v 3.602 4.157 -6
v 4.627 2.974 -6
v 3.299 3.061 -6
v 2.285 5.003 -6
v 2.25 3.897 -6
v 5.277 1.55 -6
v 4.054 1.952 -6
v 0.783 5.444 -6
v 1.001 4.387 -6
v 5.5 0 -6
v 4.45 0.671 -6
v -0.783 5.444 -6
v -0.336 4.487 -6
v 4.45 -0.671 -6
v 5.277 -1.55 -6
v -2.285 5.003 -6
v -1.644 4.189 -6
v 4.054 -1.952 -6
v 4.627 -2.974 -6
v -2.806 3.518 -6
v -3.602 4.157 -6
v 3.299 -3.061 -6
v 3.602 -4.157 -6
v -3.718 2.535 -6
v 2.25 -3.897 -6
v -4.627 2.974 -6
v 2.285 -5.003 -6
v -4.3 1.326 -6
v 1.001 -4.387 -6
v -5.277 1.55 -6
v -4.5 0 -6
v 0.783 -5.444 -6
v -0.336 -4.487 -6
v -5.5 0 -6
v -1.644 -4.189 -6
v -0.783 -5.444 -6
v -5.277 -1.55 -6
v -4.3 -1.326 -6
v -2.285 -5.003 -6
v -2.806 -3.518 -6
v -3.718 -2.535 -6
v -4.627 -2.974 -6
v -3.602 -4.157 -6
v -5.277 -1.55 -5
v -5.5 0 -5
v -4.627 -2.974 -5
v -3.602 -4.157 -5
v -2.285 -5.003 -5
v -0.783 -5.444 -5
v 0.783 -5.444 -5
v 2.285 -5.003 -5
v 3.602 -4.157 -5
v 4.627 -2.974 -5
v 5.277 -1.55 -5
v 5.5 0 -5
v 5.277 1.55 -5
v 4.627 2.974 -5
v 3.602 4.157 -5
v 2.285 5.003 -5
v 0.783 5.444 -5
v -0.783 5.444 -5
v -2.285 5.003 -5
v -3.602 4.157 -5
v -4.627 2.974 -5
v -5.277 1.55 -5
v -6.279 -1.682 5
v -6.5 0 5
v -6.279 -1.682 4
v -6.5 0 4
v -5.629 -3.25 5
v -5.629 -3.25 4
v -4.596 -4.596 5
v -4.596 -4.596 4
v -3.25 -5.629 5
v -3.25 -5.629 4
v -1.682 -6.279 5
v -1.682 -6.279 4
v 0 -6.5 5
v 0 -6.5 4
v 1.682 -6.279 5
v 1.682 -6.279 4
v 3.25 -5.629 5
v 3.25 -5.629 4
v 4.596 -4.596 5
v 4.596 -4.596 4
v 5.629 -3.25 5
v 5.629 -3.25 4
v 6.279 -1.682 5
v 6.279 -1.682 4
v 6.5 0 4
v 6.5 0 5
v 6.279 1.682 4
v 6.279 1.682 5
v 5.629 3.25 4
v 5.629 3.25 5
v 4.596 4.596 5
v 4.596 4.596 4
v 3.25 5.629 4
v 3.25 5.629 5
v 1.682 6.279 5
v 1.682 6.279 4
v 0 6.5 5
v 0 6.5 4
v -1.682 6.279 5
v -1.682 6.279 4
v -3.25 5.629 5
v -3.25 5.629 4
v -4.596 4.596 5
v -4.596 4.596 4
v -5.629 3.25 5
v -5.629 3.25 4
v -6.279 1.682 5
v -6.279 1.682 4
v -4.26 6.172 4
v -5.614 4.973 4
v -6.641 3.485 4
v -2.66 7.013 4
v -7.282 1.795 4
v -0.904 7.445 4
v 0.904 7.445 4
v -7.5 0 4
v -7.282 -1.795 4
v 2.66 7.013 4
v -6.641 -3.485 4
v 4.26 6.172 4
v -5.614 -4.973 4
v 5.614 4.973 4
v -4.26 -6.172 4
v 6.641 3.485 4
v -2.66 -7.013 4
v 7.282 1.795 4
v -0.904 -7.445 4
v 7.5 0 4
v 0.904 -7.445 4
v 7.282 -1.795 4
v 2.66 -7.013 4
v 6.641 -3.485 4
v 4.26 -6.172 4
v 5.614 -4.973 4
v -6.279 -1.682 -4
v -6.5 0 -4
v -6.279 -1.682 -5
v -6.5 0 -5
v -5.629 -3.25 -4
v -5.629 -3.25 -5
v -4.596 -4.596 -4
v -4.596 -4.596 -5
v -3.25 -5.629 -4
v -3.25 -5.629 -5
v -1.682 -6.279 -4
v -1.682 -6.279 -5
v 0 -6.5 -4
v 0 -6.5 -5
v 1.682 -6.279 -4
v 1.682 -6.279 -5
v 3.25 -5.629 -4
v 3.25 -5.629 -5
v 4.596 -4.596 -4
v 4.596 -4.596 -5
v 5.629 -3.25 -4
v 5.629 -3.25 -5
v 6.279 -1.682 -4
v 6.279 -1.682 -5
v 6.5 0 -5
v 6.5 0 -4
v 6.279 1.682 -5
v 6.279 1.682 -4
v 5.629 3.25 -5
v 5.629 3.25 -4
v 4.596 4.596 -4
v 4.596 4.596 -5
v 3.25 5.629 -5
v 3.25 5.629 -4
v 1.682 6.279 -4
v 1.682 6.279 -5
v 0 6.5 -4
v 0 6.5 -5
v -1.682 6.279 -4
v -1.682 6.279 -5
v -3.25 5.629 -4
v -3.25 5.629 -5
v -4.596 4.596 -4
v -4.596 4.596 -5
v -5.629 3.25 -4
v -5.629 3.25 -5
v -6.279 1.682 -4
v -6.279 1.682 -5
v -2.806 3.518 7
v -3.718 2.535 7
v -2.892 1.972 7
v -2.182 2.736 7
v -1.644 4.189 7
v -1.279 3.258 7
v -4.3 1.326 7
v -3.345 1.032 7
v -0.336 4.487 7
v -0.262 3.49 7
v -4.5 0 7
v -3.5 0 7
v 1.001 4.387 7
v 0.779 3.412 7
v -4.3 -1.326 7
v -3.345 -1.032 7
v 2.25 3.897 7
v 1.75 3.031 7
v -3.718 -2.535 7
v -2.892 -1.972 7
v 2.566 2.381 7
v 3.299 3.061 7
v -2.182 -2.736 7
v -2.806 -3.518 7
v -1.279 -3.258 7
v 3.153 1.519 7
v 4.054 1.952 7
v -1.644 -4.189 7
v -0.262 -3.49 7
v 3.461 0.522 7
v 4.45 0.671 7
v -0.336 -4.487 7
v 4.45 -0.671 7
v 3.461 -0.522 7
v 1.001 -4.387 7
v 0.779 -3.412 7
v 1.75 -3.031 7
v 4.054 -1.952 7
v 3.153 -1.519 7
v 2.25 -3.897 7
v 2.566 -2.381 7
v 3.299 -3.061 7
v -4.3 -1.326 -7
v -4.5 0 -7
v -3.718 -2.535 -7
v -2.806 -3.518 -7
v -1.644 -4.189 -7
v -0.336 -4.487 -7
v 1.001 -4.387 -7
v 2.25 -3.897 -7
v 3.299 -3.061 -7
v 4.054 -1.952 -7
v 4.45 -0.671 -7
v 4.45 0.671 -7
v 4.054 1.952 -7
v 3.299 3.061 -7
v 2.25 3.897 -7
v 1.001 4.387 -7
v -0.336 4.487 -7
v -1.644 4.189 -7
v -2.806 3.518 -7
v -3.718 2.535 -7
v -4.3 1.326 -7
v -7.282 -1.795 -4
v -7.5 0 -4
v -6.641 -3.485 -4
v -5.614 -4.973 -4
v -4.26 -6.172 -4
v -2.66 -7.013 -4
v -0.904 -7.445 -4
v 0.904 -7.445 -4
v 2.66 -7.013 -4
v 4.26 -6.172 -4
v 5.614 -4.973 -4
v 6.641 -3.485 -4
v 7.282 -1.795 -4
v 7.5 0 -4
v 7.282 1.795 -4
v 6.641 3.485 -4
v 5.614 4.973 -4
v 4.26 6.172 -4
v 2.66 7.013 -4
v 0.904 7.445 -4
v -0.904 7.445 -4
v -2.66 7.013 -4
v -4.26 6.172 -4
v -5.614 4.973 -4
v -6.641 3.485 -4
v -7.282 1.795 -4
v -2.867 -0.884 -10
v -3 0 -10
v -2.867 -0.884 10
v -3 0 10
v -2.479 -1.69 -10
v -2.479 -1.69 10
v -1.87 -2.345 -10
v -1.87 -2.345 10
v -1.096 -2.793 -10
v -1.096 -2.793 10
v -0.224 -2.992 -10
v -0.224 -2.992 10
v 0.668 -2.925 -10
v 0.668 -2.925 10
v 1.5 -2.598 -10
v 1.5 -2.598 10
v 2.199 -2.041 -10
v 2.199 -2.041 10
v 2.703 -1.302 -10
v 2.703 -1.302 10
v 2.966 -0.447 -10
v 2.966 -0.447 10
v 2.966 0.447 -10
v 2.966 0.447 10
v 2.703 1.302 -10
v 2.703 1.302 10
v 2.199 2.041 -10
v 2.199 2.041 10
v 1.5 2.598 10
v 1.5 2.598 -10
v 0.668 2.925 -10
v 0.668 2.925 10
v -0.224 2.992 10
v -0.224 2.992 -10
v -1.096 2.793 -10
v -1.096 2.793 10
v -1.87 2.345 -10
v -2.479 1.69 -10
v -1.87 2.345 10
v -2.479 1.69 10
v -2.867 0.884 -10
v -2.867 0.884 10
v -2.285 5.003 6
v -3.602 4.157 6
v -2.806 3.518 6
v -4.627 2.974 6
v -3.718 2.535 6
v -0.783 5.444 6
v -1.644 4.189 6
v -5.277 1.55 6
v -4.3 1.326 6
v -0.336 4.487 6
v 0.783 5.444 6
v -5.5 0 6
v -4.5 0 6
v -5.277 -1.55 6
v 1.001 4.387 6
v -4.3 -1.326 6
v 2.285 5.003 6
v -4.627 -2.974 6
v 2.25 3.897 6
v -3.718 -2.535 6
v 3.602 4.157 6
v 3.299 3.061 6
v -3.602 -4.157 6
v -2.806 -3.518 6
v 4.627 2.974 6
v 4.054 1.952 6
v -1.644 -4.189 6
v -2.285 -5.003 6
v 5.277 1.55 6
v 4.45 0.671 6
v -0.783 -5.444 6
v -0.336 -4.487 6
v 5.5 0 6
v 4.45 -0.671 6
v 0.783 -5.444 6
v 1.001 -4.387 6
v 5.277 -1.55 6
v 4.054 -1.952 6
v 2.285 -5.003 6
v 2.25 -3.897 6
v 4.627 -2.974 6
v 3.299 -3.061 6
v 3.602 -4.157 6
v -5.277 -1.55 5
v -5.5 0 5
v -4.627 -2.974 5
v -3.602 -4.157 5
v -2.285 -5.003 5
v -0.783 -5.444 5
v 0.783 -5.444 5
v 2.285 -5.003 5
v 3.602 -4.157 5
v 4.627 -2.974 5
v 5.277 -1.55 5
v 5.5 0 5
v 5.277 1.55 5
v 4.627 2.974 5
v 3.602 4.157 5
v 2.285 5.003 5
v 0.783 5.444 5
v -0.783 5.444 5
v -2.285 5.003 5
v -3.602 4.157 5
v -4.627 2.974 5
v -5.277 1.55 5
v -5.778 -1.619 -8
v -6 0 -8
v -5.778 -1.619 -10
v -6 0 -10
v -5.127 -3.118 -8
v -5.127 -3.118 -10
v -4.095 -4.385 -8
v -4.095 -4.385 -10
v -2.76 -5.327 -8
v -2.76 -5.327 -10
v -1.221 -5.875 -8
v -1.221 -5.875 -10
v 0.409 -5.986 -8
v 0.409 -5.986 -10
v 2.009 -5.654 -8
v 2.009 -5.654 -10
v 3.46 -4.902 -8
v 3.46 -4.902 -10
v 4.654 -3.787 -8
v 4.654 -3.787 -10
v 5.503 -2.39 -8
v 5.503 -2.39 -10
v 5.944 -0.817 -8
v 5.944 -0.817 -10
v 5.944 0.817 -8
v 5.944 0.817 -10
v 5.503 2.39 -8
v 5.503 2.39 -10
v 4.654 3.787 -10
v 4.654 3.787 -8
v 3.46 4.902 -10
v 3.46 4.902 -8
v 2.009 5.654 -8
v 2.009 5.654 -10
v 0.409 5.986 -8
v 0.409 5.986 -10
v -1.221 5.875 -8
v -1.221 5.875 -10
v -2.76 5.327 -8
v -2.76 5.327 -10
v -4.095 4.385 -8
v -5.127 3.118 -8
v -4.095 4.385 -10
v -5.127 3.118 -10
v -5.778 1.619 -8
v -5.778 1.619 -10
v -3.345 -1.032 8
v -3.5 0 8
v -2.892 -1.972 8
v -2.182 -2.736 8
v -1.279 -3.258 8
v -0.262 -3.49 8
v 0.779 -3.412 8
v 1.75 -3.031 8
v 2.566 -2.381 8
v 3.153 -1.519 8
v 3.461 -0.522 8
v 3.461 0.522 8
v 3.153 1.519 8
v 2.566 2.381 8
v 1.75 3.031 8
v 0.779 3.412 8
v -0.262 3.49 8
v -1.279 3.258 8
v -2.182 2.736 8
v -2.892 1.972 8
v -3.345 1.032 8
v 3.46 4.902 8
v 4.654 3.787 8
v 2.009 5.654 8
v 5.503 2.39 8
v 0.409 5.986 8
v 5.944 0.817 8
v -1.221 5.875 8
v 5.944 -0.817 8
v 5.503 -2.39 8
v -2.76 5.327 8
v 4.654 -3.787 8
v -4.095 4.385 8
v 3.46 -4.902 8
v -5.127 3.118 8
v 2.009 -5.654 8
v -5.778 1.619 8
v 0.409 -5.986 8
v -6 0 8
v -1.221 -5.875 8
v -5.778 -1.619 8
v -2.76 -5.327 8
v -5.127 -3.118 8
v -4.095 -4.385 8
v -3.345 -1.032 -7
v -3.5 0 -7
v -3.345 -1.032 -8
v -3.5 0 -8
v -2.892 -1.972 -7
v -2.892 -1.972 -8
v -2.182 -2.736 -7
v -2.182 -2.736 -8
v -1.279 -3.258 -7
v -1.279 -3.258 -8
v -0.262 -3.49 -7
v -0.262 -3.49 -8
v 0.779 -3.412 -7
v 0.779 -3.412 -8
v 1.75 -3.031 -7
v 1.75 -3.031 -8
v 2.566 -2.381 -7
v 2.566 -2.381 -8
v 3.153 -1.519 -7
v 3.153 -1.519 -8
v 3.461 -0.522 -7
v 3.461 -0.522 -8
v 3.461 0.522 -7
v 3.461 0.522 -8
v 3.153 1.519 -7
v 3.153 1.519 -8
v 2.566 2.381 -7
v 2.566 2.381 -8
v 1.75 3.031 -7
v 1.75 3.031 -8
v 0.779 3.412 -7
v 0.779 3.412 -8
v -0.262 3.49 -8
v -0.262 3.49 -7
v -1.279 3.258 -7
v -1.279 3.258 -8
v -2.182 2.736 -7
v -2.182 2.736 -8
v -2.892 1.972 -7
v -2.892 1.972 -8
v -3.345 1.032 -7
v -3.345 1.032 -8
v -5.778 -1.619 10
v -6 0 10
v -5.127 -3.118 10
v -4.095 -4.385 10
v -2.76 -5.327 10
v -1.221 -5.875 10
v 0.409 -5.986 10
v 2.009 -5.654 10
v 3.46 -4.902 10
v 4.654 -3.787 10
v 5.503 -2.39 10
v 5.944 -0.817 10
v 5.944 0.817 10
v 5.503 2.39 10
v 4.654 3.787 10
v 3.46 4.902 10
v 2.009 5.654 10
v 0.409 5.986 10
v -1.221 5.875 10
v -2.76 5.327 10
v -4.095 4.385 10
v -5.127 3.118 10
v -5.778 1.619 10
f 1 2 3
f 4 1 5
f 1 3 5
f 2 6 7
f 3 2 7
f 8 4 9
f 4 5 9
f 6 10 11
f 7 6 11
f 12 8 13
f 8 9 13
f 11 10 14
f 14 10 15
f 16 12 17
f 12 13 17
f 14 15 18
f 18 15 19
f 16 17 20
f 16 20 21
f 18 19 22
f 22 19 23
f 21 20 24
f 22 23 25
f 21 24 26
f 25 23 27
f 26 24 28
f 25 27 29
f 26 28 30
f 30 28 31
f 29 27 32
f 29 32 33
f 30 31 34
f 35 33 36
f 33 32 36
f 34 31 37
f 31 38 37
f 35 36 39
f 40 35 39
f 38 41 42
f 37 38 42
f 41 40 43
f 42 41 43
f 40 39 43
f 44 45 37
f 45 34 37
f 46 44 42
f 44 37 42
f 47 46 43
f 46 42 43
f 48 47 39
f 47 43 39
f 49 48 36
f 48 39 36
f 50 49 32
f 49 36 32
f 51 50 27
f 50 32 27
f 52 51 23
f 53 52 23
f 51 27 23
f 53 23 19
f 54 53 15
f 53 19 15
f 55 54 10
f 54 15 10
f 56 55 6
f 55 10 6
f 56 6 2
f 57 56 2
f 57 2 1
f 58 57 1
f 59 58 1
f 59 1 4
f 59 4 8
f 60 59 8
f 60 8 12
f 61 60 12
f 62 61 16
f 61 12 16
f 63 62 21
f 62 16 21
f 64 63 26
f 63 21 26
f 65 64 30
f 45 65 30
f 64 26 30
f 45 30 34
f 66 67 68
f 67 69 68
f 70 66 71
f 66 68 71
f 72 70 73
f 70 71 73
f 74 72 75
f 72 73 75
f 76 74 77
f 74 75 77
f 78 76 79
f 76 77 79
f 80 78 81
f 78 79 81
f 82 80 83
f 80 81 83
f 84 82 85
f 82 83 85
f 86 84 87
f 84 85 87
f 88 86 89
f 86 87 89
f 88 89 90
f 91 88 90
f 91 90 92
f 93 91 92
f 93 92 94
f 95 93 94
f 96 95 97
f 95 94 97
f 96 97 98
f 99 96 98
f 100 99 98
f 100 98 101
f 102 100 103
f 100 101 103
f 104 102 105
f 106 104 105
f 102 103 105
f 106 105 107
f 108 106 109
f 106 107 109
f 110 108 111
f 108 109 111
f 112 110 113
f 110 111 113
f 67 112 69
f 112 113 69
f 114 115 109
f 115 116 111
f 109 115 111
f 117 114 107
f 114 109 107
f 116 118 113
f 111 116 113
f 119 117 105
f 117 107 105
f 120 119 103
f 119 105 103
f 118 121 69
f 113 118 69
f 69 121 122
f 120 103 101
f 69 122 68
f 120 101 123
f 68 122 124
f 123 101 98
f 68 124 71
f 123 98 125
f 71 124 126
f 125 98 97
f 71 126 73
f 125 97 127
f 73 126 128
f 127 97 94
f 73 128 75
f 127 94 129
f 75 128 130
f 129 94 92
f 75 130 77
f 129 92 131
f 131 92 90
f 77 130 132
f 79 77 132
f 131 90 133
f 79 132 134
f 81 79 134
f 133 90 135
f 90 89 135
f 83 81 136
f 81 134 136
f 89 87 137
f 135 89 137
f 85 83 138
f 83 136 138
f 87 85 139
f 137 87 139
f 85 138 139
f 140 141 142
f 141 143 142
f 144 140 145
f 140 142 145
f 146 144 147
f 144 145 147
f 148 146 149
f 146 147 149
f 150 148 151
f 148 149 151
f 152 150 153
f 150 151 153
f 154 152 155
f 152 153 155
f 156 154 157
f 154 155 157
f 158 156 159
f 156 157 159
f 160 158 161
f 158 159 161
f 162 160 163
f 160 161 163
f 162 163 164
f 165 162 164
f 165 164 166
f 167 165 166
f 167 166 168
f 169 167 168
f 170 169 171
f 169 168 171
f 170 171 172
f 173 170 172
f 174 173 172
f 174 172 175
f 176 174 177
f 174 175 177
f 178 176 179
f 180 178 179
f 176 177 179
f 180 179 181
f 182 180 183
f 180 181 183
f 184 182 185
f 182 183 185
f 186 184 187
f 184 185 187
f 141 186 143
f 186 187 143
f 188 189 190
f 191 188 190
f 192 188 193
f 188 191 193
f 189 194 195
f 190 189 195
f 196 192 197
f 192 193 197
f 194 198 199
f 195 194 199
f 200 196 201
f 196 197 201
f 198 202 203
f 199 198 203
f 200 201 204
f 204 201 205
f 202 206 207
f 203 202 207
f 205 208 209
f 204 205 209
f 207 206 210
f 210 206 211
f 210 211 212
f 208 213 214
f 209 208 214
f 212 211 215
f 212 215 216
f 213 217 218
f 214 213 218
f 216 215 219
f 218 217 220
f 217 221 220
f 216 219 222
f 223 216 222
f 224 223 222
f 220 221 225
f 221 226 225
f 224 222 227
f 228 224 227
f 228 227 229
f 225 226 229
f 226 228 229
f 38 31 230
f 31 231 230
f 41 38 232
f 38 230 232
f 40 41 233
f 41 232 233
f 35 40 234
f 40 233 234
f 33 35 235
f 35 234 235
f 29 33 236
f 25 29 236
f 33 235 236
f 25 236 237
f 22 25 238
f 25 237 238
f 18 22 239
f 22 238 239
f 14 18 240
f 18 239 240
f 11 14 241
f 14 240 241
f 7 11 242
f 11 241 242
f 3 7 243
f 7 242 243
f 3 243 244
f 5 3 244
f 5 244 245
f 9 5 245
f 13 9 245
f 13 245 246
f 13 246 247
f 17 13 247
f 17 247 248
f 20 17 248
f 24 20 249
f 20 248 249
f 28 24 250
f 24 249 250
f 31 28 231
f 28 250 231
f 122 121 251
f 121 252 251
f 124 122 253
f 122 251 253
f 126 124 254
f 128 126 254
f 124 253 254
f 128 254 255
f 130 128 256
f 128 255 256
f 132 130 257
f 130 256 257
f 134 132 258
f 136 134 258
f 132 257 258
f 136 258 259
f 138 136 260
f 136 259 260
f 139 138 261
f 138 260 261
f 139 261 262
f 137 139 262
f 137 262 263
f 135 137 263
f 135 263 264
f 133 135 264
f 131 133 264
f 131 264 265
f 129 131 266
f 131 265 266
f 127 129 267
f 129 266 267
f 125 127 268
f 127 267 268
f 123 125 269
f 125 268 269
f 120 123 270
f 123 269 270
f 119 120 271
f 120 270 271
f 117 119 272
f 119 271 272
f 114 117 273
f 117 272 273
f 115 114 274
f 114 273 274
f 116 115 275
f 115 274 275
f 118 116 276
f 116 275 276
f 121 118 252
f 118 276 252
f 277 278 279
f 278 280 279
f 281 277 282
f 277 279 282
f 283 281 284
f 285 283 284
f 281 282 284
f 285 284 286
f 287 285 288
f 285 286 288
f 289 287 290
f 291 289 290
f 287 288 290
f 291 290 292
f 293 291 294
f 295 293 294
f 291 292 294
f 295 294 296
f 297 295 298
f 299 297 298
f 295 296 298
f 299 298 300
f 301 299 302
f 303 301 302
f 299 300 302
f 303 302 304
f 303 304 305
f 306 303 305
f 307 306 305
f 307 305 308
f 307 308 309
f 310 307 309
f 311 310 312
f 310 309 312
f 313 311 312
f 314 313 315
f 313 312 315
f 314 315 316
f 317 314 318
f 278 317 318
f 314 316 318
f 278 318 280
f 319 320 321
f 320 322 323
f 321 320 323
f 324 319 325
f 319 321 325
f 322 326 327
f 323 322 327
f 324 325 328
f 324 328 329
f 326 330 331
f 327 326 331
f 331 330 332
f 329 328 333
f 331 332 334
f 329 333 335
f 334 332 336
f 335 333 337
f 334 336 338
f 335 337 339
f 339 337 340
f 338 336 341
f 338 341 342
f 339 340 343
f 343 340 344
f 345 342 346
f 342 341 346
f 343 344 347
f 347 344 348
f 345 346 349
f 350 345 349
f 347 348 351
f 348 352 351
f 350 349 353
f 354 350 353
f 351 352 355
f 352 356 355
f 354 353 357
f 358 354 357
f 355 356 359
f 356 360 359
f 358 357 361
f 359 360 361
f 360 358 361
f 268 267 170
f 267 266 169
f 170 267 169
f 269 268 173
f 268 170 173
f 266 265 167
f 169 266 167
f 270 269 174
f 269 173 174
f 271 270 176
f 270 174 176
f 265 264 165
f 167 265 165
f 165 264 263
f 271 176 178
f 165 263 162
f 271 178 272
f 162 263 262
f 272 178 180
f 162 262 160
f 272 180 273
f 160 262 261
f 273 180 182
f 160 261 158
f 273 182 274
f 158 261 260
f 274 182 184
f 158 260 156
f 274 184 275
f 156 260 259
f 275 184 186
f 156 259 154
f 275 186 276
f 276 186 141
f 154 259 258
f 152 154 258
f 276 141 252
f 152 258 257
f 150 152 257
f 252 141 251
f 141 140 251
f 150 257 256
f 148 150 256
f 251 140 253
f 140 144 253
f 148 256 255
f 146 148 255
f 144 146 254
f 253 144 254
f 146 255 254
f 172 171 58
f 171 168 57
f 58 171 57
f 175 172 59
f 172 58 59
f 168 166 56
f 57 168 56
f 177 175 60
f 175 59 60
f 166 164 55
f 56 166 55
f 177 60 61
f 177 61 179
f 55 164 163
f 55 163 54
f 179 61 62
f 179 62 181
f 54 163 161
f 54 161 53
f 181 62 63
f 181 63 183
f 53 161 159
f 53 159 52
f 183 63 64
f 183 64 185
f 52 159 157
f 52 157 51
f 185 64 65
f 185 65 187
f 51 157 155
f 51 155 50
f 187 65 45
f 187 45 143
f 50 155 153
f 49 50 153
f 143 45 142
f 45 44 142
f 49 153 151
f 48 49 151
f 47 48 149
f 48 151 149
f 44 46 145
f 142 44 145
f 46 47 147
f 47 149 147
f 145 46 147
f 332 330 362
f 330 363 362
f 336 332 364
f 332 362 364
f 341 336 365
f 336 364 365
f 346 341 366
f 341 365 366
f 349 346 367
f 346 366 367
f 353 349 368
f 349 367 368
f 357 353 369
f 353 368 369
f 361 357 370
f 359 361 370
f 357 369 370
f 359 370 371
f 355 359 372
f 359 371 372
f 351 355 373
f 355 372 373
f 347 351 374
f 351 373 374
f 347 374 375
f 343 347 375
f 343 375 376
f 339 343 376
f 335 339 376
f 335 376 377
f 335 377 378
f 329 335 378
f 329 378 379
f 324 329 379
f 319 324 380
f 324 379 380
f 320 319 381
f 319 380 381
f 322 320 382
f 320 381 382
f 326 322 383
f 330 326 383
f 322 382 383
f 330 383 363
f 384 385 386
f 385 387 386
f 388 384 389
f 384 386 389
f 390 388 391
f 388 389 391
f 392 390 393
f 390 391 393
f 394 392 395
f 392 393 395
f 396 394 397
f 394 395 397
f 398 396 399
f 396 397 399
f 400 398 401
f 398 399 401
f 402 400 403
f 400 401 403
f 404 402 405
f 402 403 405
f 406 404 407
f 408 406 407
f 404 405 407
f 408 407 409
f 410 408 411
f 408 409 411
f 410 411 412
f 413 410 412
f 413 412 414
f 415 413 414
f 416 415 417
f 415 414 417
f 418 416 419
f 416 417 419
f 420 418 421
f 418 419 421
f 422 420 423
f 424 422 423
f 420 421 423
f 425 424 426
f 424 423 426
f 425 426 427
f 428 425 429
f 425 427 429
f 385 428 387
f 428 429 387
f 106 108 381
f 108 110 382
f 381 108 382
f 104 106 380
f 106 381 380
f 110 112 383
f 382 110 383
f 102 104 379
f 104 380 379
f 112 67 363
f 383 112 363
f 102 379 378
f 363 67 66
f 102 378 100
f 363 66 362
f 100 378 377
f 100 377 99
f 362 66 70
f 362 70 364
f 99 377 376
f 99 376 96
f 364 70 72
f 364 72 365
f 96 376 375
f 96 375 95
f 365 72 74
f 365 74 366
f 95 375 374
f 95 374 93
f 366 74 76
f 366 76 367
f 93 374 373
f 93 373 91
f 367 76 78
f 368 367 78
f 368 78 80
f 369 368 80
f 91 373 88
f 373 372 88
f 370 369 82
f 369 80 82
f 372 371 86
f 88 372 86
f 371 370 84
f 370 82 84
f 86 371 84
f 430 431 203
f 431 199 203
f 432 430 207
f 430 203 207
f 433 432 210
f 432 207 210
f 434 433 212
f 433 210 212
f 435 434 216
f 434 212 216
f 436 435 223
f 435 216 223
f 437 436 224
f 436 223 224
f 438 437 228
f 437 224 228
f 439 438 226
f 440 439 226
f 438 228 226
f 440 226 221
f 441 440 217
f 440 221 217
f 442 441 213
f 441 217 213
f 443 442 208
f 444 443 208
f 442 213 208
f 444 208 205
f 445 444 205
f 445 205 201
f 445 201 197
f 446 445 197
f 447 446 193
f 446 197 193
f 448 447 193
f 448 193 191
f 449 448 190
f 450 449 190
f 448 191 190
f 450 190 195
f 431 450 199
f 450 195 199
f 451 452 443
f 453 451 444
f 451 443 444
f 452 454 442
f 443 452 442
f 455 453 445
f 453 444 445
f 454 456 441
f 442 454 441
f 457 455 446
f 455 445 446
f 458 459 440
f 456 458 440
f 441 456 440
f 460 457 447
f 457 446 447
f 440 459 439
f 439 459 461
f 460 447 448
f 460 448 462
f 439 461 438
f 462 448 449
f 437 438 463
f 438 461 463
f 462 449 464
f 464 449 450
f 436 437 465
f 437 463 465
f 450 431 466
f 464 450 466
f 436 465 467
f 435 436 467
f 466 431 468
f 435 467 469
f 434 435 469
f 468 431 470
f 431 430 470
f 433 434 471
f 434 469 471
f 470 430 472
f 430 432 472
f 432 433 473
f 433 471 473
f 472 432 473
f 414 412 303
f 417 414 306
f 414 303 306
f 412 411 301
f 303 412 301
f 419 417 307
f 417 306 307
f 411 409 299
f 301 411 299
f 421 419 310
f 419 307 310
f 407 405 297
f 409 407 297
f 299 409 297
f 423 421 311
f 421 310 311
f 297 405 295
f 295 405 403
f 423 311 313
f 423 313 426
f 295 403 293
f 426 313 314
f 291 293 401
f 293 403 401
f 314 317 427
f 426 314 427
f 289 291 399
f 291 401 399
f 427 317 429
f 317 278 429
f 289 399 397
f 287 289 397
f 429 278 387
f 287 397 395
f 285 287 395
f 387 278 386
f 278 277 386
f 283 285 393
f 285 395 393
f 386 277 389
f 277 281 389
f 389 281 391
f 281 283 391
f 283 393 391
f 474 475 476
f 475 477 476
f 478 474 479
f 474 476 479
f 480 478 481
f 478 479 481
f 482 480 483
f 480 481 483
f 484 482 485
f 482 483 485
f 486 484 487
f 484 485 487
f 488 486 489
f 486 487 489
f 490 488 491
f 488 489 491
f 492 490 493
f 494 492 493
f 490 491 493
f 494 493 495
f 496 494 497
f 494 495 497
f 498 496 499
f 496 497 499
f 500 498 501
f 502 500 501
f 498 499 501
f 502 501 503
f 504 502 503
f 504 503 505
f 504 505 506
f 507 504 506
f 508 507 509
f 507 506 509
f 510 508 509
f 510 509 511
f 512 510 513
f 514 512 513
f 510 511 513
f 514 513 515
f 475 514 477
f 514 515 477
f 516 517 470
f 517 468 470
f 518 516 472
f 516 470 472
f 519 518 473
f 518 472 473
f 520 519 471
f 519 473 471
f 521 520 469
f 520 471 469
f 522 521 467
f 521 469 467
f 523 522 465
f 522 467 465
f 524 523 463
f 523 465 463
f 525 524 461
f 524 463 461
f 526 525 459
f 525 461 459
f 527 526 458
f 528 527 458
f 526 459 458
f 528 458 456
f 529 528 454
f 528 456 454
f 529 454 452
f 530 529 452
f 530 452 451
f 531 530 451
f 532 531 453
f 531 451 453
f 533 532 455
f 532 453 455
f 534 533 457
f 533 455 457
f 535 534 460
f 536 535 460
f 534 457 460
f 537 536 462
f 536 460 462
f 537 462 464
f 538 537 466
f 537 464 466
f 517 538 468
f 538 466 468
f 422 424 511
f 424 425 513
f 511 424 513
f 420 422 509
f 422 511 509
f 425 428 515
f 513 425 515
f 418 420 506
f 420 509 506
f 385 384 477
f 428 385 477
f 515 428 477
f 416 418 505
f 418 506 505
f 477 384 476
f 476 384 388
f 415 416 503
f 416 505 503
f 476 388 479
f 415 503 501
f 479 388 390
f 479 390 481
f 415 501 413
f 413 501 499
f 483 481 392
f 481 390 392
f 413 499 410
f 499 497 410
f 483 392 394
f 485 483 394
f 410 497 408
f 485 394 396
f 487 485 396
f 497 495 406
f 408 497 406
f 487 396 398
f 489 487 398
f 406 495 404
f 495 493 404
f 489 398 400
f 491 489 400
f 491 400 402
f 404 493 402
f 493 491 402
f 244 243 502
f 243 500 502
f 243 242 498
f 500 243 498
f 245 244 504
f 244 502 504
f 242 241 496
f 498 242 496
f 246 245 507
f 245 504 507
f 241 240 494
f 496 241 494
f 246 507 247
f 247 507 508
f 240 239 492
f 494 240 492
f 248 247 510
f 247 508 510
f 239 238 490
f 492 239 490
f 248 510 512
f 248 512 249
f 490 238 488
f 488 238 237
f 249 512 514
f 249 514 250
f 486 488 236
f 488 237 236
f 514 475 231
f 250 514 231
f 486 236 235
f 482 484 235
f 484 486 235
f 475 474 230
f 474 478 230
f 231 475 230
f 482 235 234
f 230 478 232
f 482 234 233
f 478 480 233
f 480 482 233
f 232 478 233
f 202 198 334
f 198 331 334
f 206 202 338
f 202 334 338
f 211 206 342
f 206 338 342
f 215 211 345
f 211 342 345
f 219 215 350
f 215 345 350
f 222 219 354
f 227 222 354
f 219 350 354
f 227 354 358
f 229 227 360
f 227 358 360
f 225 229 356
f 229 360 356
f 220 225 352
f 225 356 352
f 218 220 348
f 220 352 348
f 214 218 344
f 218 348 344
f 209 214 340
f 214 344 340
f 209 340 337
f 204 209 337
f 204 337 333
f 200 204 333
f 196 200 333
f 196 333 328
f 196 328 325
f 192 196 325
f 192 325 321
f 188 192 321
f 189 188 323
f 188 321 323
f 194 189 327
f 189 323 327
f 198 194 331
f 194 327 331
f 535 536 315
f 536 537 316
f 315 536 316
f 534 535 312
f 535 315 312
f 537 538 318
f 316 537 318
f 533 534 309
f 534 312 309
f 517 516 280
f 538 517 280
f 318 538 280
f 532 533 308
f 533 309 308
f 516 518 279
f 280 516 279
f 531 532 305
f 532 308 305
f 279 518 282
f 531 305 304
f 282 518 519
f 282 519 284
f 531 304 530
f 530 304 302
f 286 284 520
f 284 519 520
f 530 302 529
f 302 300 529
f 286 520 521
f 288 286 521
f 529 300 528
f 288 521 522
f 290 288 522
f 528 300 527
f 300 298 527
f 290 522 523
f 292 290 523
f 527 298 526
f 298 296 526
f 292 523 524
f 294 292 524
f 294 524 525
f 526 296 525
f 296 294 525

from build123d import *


with BuildPart() as part:
    # Эскиз1 → Повернуть1 (revolve)
    with BuildSketch(Plane(origin=(0, 0, 0), x_dir=(1, 0, 0), z_dir=(0, 1, 0)), mode=Mode.PRIVATE) as revolve_1_sk:
        Polygon((5.5, 5), (5.5, 6), (4.5, 6), (4.5, 7), (3.5, 7), (3.5, 8), (6, 8), (6, 10), (3, 10), (3, -10), (6, -10), (6, -8), (3.5, -8), (3.5, -7), (4.5, -7), (4.5, -6), (5.5, -6), (5.5, -5), (6.5, -5), (6.5, -4), (7.5, -4), (7.5, 4), (6.5, 4), (6.5, 5), align=None)
    revolve(revolve_1_sk.sketch.rotate(Axis((0, 0, -10), (0, 0, 1)), 180), axis=Axis((0, 0, -10), (0, 0, 1)))


solid = part.part
